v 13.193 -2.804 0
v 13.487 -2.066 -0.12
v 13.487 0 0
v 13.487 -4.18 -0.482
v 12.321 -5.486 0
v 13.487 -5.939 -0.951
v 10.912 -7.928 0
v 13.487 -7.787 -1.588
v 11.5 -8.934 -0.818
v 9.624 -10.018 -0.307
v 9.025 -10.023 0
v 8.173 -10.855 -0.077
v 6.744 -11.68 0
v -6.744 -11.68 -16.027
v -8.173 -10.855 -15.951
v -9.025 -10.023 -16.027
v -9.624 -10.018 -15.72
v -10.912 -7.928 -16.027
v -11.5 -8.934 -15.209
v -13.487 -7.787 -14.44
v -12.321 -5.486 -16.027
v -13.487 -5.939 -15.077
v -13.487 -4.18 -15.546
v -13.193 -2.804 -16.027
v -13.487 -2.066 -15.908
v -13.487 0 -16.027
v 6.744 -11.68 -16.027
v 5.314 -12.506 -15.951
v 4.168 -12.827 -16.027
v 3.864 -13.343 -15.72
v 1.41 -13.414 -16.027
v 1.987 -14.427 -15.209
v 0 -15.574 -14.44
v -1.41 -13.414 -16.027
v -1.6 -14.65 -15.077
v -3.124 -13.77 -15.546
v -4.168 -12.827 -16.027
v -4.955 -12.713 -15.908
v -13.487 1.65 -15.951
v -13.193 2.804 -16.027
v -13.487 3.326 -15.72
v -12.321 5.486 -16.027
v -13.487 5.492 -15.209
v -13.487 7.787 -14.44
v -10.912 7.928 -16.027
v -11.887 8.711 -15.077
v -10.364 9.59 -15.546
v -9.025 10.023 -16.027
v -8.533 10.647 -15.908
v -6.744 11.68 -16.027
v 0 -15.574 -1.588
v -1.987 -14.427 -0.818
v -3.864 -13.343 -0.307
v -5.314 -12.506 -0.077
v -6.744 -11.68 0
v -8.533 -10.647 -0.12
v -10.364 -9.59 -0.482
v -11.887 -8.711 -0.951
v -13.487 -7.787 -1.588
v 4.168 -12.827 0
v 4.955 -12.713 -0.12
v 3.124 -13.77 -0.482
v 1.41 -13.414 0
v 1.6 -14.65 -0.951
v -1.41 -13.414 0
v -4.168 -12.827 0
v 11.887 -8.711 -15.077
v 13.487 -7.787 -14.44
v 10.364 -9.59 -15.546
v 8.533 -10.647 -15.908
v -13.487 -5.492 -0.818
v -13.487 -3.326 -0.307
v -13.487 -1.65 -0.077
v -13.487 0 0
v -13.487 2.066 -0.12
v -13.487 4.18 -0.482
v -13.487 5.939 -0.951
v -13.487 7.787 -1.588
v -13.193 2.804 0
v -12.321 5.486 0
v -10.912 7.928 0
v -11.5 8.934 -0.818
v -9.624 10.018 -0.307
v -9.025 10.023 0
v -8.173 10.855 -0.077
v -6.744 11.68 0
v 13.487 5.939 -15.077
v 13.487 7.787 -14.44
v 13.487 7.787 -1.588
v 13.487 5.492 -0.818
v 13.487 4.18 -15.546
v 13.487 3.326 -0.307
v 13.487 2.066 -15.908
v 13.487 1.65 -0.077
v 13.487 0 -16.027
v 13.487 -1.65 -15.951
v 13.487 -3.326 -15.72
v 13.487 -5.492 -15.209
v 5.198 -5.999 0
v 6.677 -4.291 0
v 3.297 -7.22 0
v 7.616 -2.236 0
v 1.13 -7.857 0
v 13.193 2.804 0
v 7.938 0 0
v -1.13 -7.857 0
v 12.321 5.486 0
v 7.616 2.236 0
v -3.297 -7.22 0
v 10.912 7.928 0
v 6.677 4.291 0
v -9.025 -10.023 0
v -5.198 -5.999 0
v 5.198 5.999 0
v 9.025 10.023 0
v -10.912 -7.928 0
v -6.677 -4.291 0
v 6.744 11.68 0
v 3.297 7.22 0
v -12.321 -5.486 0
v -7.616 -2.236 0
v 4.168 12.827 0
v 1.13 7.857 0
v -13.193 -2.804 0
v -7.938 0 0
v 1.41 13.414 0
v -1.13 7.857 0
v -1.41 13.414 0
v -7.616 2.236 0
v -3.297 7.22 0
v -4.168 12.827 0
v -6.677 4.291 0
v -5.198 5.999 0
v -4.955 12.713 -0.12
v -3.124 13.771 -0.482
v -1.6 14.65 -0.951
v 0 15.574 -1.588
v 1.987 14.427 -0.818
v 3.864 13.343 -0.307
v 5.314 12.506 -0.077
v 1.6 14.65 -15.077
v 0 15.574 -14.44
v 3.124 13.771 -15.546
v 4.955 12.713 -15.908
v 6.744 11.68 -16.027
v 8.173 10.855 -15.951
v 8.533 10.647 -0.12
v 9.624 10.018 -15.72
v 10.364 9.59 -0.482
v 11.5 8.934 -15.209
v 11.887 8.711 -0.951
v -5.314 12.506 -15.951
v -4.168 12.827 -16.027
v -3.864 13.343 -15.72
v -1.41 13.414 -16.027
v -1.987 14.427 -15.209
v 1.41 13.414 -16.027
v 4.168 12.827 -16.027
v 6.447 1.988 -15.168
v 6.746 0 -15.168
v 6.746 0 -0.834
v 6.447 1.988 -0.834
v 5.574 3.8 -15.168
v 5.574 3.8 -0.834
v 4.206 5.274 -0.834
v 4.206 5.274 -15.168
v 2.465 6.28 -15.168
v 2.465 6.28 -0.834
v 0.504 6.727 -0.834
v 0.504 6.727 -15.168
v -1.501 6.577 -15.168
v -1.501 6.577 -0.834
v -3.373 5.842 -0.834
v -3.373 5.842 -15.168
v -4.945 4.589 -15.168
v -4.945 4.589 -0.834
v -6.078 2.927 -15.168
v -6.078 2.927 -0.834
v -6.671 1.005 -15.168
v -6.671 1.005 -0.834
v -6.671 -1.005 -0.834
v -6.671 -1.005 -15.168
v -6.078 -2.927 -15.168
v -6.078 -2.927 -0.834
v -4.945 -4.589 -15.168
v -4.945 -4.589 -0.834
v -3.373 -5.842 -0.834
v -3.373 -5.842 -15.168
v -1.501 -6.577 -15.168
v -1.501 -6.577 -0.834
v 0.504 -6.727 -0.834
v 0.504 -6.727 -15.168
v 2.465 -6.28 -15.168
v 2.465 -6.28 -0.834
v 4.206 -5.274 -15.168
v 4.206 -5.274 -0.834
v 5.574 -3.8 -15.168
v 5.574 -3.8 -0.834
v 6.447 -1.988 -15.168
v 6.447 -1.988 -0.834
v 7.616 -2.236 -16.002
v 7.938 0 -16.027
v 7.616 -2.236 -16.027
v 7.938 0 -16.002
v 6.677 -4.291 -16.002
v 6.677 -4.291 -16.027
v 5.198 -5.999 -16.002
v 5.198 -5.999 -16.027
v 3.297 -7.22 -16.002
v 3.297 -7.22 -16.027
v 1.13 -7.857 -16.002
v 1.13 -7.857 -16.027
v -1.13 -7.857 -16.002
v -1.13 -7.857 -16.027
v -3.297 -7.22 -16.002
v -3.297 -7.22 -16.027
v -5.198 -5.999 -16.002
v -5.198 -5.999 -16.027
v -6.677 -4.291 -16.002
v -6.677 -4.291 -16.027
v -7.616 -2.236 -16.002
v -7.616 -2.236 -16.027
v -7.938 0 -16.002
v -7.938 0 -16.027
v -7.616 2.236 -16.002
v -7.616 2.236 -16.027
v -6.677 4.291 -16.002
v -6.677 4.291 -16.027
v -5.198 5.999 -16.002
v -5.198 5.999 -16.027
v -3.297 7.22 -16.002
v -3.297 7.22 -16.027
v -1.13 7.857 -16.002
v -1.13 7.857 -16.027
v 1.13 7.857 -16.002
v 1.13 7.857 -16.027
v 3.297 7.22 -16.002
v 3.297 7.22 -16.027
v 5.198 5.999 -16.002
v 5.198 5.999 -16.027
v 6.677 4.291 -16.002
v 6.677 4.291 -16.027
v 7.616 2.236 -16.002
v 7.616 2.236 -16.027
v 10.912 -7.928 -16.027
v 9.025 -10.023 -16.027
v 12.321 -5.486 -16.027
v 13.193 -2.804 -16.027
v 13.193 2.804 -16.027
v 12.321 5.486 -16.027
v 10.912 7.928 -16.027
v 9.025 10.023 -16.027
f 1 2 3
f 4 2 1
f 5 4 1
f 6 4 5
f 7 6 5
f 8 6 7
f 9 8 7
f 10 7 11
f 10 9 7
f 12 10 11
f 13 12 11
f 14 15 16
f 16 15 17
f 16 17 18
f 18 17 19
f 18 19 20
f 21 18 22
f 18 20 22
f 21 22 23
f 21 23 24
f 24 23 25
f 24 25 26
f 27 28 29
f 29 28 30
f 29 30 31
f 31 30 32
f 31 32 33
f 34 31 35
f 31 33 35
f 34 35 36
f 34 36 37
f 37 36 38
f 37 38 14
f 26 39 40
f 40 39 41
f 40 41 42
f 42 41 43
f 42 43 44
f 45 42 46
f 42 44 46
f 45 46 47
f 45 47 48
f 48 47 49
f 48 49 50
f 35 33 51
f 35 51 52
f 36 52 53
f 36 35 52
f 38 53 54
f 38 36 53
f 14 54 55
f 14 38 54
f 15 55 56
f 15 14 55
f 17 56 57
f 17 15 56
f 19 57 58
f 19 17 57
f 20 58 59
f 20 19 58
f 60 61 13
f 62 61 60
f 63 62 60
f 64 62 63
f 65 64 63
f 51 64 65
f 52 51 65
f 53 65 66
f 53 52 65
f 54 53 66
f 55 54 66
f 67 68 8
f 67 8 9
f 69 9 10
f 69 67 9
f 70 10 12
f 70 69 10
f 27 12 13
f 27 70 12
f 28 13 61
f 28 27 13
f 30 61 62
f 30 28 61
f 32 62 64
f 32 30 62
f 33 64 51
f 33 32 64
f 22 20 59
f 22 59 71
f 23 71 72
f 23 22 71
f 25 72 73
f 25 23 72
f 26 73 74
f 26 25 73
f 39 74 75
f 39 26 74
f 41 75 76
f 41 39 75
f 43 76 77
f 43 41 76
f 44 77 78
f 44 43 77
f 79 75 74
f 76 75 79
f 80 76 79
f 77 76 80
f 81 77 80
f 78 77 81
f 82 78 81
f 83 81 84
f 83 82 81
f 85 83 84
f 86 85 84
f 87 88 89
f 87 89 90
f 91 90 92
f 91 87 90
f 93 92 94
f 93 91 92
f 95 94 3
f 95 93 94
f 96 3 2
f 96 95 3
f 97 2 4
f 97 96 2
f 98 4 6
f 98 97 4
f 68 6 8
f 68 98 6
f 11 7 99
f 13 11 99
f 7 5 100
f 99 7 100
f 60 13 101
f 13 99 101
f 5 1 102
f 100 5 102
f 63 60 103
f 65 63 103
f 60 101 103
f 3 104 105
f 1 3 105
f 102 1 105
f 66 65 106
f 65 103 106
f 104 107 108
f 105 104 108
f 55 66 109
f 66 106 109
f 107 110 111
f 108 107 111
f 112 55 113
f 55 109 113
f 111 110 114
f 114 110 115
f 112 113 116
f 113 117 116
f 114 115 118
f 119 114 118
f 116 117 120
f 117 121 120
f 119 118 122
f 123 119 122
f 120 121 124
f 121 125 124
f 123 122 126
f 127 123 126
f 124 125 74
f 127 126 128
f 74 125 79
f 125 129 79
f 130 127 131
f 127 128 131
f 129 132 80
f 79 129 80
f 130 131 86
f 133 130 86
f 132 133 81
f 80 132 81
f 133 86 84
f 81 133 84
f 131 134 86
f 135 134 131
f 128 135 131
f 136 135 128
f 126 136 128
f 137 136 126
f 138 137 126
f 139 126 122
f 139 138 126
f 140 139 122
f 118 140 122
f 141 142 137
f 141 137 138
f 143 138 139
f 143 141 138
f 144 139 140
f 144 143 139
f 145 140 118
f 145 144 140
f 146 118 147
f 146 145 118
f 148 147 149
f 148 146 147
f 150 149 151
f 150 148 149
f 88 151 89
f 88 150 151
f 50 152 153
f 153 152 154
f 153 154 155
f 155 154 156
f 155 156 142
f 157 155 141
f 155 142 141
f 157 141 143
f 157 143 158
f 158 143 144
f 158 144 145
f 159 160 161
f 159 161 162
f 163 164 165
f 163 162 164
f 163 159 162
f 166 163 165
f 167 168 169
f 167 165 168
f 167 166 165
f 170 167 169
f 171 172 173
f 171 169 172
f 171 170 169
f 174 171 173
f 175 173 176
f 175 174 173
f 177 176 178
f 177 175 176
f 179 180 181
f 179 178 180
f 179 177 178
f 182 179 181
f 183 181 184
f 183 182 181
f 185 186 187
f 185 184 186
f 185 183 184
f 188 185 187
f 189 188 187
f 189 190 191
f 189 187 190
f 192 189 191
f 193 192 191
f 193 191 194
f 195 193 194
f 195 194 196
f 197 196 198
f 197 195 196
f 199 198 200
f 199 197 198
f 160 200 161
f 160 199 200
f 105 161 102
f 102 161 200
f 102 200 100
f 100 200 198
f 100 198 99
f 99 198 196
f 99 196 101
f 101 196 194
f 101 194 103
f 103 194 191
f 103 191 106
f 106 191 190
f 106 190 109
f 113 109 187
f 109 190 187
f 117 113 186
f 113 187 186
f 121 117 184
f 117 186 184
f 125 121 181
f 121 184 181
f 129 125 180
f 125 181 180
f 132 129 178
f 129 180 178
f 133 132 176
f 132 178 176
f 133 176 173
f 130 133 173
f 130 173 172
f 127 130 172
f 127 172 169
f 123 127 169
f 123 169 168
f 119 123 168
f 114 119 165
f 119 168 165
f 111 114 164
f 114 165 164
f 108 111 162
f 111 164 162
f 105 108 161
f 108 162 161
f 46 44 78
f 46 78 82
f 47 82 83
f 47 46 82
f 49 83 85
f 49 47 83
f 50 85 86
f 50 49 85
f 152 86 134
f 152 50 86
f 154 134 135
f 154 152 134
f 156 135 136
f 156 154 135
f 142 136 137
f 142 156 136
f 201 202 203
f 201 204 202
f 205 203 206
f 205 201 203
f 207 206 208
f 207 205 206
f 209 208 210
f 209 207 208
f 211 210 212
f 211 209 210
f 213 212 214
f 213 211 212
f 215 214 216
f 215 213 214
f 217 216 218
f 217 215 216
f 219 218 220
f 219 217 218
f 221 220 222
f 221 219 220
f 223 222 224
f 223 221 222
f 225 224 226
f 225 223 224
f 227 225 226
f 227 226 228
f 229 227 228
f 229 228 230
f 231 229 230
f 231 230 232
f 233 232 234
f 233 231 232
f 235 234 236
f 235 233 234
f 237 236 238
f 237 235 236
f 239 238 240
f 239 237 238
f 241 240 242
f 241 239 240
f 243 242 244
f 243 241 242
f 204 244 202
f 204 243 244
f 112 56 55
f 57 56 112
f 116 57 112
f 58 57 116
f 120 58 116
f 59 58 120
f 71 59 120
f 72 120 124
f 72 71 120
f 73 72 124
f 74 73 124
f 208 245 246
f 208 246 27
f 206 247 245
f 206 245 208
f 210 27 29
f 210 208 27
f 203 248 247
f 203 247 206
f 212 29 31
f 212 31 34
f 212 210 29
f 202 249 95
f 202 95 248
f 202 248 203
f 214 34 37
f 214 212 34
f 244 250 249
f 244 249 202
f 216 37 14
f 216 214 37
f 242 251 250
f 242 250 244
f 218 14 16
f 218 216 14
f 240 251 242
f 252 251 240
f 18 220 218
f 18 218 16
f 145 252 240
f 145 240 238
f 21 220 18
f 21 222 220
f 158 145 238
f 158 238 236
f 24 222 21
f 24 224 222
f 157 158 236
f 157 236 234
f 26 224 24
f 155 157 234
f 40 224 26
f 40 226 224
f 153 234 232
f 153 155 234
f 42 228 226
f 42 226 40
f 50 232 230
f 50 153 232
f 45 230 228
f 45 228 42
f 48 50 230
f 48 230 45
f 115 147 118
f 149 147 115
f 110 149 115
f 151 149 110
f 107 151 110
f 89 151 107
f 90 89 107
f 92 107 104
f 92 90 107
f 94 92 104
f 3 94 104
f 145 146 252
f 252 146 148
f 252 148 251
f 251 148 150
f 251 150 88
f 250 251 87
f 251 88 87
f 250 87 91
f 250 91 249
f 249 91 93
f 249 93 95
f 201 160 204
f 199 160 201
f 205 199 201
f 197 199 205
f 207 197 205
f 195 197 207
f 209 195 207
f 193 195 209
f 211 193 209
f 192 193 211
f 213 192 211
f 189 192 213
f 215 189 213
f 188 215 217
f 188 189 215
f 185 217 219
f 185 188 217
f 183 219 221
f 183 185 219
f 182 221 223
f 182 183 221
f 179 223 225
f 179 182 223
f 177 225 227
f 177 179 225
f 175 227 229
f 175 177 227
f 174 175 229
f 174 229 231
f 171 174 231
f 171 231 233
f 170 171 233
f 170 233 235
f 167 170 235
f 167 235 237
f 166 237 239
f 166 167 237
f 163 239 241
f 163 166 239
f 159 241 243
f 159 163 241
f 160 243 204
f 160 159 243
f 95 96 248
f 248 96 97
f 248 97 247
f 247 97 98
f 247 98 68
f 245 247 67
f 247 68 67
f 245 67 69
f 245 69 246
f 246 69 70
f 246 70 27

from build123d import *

# Parameters (mm, degrees)
BASENUT_START = -16.0274
BASENUTSKE_R  = 6.74624
BASENUT_DEPTH = 16.0274


with BuildPart() as part:
    # BaseNutSke → BaseNut (new body)
    with BuildSketch(Plane.XY.offset(BASENUT_START)):
        Polygon((13.4874, 7.786954021), (13.4874, -7.786954021), (0, -15.573908041), (-13.4874, -7.786954021), (-13.4874, 7.786954021), (0, 15.573908041), align=None)
        Circle(BASENUTSKE_R, mode=Mode.SUBTRACT)
    extrude(amount=BASENUT_DEPTH)

    # Sketch3 → Double-Chamfer (revolve, cut)
    with BuildSketch(Plane(origin=(0, 0, 0), x_dir=(0, 0, -1), z_dir=(1, 0, 0))):
        Polygon((16.0274, 13.4874), (14.4399, 15.573908041), (14.4399, 28.273908041), (28.7274, 28.273908041), (28.7274, 13.4874), align=None)
        Polygon((1.5875, 28.273908041), (-12.7, 28.273908041), (-12.7, 13.4874), (0, 13.4874), (1.5875, 15.573908041), align=None)
    revolve(axis=Axis((0, 0, 0), (0, 0, -1)), mode=Mode.SUBTRACT)

    # Sketch5 → EndChamfer (revolve, cut)
    with BuildSketch(Plane(origin=(0, 0, 0), x_dir=(0, 0, -1), z_dir=(1, 0, 0)), mode=Mode.PRIVATE) as endchamfer_sk:
        Polygon((16.002, 7.9375), (15.084457845, 6.627114), (16.0528, 6.627114), (16.0528, 7.9375), align=None)
        Polygon((-0.0508, 7.9375), (0, 7.9375), (0.917542155, 6.627114), (-0.0508, 6.627114), align=None)
    revolve(endchamfer_sk.sketch.rotate(Axis((0, 0, -25.037505729), (0, 0, -1)), 90), axis=Axis((0, 0, -25.037505729), (0, 0, -1)), mode=Mode.SUBTRACT)


solid = part.part
